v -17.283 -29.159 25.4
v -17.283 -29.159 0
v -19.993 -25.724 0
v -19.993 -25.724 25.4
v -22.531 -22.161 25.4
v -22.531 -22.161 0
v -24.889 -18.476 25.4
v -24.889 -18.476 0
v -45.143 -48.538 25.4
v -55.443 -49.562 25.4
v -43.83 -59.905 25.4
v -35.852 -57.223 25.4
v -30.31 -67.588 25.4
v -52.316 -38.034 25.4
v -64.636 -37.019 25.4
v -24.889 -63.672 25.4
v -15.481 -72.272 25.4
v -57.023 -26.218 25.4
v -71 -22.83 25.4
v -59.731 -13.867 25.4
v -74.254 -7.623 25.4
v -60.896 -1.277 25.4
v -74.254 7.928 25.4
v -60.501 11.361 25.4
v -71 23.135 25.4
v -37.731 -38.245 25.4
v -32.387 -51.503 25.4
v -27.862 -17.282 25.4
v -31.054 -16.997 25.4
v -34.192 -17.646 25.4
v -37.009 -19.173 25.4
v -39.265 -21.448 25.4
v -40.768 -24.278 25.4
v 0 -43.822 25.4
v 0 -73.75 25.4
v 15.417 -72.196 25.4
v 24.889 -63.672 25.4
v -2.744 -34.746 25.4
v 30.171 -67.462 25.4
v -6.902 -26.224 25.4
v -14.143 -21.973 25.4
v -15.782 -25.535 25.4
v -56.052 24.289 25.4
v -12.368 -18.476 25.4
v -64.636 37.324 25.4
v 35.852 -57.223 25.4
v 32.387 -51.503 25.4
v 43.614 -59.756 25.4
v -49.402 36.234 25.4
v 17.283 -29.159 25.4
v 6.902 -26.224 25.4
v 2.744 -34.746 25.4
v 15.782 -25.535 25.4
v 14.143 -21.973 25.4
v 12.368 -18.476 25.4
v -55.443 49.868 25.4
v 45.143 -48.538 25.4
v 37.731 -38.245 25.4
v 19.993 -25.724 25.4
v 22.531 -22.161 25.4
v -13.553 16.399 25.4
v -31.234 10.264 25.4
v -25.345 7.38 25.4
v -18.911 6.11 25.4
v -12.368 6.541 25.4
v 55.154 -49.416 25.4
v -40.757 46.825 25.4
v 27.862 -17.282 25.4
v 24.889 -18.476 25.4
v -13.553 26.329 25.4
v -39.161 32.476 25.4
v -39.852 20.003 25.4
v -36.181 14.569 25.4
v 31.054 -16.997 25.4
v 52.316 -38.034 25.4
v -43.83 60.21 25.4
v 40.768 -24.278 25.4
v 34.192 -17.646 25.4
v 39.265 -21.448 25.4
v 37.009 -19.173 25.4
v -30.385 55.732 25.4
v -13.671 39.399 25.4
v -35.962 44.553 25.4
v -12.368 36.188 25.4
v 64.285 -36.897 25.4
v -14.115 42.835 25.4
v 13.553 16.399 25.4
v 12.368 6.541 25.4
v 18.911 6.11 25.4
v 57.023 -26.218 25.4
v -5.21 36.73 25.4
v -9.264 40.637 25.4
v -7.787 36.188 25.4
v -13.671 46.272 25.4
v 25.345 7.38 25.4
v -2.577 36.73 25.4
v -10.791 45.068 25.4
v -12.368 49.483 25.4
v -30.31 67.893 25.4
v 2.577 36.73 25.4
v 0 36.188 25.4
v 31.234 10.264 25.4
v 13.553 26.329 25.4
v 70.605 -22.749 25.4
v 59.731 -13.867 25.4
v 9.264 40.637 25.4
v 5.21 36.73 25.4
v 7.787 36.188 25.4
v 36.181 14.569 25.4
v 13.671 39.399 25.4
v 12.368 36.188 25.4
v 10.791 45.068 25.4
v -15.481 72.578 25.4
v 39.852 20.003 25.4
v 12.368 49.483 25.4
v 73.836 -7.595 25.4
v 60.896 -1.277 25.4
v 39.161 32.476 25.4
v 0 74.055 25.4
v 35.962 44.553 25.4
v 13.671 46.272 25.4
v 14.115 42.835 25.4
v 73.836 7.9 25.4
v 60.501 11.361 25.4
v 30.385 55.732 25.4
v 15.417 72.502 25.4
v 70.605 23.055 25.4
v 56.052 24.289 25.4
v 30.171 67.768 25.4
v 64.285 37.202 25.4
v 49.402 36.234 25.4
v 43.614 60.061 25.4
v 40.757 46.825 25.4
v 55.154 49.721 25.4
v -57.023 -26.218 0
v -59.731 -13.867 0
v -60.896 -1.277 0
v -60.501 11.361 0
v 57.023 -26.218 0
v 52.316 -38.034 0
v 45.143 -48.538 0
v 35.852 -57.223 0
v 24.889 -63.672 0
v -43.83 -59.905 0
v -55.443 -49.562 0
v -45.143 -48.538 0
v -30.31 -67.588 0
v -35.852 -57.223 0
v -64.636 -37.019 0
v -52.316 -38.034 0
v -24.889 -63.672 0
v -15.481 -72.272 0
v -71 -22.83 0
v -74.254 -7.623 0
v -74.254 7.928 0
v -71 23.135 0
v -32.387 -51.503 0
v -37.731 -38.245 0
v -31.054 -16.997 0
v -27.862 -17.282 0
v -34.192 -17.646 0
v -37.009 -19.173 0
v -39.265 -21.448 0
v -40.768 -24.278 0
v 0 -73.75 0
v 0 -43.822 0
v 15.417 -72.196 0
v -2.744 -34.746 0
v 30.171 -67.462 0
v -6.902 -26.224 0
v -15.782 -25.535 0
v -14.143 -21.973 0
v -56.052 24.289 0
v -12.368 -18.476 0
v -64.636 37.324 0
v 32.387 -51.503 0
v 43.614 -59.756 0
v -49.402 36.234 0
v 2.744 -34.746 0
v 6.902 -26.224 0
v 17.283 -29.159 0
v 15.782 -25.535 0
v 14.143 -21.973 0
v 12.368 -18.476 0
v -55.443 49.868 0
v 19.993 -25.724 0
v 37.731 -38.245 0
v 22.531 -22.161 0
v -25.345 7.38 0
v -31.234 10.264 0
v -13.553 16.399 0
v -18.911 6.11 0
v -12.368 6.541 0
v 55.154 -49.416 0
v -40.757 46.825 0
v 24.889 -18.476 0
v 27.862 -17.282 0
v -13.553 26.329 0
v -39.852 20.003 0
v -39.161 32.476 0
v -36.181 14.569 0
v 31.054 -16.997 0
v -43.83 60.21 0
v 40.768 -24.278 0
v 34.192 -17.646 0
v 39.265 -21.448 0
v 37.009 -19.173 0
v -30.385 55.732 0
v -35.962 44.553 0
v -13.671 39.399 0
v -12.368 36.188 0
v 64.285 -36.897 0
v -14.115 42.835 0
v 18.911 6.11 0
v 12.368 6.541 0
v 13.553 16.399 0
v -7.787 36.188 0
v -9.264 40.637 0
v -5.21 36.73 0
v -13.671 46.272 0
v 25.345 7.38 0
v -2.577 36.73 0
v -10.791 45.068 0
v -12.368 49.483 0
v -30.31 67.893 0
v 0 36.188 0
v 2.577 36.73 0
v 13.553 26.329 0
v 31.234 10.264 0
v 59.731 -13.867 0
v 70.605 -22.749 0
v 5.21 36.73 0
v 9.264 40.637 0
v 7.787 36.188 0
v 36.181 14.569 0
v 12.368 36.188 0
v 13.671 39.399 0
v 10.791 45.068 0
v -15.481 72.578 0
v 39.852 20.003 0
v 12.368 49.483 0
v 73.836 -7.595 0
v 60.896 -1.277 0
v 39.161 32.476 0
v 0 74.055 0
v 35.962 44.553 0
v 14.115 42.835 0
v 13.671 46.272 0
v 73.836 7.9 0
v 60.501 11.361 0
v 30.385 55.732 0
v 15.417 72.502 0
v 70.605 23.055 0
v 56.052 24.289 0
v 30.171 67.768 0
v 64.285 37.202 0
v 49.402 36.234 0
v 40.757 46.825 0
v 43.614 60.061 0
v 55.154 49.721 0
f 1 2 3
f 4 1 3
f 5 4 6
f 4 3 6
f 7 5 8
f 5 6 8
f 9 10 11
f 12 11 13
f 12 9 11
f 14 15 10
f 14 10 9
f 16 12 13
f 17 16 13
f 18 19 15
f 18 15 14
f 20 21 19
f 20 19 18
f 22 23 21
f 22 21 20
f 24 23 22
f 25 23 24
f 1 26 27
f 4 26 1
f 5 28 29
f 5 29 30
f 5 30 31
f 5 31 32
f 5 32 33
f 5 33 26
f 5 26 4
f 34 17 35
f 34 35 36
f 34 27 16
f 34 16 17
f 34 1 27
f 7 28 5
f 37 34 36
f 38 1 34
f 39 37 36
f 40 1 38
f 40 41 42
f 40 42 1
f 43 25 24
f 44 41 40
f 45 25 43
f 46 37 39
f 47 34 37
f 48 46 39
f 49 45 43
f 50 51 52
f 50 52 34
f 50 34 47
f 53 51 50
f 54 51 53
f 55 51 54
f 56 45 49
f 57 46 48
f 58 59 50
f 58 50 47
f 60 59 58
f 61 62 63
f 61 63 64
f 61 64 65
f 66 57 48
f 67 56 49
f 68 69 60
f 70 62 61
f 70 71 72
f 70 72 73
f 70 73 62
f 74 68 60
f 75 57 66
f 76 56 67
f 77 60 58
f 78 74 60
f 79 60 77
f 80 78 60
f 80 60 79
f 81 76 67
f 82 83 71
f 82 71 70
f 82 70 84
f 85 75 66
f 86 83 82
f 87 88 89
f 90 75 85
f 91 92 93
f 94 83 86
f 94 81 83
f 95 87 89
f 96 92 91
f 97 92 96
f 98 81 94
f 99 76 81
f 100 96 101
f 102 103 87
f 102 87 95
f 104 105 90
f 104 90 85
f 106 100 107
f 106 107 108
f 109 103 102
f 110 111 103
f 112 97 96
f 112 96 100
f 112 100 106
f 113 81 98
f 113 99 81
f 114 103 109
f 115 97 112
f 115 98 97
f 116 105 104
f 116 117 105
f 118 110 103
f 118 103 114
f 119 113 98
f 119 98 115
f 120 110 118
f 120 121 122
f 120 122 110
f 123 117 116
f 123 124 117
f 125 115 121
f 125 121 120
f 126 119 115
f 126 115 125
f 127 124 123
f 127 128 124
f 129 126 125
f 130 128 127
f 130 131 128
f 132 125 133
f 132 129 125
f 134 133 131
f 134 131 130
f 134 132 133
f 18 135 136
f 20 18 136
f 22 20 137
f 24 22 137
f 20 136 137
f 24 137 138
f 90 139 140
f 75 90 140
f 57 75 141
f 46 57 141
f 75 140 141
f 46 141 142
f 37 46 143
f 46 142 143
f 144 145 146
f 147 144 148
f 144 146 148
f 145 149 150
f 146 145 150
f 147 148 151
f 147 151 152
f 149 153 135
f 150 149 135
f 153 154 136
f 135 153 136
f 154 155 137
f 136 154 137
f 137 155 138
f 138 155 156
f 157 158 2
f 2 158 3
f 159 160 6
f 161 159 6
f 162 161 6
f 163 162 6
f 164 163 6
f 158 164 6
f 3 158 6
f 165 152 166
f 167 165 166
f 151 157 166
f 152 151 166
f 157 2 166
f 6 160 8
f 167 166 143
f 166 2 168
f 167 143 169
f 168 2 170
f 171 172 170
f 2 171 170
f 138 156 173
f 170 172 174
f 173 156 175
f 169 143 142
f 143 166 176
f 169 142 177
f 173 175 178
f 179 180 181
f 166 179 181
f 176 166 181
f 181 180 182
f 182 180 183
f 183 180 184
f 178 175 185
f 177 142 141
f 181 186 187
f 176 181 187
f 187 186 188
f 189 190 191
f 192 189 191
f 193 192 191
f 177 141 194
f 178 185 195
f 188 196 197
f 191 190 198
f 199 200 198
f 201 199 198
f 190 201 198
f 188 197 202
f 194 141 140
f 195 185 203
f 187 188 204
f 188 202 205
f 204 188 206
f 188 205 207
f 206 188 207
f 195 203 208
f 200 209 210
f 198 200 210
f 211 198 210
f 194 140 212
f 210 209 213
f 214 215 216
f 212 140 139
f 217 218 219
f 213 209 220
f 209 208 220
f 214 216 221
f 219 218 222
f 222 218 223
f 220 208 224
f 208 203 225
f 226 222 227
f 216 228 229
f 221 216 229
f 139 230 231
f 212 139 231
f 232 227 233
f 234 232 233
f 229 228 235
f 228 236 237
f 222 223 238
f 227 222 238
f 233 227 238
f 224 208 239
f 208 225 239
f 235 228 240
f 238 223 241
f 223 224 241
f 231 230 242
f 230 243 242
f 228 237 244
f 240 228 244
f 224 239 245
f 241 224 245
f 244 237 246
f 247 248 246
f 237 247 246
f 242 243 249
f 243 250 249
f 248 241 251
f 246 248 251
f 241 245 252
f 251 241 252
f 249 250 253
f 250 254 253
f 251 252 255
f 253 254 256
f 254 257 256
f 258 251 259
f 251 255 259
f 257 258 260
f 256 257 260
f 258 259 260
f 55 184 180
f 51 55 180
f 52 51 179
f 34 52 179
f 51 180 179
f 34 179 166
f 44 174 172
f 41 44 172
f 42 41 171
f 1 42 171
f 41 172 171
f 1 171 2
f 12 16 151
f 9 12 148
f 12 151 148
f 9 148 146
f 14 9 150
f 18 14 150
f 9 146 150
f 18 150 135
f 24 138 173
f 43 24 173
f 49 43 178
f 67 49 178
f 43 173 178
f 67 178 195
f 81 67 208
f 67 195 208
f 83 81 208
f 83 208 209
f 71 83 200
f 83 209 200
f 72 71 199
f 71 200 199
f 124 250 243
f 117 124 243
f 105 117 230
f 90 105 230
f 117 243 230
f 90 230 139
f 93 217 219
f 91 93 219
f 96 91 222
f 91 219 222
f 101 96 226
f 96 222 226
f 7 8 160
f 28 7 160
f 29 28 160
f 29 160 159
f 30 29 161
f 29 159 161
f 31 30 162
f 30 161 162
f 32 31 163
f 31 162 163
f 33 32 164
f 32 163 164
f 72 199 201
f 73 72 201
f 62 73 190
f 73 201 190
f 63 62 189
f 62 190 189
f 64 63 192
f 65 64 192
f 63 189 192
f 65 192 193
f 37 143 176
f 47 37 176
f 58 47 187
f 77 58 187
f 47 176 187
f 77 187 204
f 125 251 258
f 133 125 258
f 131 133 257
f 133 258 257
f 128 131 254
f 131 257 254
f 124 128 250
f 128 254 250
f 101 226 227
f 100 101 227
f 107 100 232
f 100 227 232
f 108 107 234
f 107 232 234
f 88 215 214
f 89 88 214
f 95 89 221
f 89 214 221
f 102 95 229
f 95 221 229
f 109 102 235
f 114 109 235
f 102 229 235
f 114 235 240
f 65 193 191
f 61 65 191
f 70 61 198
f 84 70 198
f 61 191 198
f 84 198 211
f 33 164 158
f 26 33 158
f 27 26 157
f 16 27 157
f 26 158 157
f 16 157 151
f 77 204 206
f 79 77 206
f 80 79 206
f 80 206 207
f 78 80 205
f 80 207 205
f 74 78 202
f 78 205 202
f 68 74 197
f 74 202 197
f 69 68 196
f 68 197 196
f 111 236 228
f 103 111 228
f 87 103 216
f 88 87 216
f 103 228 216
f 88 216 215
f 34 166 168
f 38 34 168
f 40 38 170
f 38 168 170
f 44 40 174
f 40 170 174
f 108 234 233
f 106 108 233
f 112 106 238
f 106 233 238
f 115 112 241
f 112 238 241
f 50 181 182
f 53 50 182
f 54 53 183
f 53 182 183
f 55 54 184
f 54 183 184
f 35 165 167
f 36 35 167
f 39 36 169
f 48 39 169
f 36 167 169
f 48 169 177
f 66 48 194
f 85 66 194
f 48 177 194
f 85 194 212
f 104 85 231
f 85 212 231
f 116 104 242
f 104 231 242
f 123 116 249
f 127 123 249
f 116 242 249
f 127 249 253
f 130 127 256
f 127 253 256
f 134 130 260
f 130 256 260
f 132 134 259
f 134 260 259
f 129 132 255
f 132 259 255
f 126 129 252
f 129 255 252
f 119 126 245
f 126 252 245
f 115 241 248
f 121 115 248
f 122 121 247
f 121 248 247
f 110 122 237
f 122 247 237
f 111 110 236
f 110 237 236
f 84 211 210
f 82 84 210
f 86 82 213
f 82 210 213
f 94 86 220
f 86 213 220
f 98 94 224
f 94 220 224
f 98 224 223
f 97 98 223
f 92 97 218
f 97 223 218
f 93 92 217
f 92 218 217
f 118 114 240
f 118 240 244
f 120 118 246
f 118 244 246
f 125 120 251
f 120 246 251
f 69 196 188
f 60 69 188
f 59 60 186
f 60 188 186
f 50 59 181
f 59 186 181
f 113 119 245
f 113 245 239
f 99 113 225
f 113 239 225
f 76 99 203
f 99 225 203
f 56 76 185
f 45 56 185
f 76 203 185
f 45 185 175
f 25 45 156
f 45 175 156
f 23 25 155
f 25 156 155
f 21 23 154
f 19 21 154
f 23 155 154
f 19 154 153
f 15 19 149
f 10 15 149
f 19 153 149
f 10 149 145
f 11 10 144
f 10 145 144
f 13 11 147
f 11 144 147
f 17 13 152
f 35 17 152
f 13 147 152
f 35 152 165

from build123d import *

# Parameters (mm, degrees)
F1_DEPTH = 25.4


with BuildPart() as f1:
    # F0 (on Top) → F1 (new body)
    with BuildSketch(Plane.XY):
        with BuildLine():
            ThreePointArc((0, 74.055061), (-74.663883, 0.152692), (0, -73.749676))
            ThreePointArc((0, -73.749676), (74.243208, 0.152692), (0, 74.055061))
        make_face()
        with BuildLine():
            ThreePointArc((-57.023406, -26.218485), (-60.507444, -7.590035), (-60.500612, 11.36142))
            ThreePointArc((-60.500612, 11.36142), (-49.402322, 36.234016), (-30.385477, 55.732161))
            ThreePointArc((-30.385477, 55.732161), (-37.869253, 38.596059), (-39.85231, 20.002501))
            ThreePointArc((-39.85231, 20.002501), (-28.383603, 8.629948), (-12.367958, 6.540619))
            ThreePointArc((-12.367958, 6.540619), (-13.701344, 21.364175), (-12.367958, 36.187731))
            ThreePointArc((-12.367958, 36.187731), (-14.11452, 42.835135), (-12.367958, 49.482539))
            ThreePointArc((-12.367958, 49.482539), (-10.020724, 42.85473), (-7.787234, 36.187731))
            ThreePointArc((-7.787234, 36.187731), (-3.893617, 36.798721), (0, 36.187731))
            ThreePointArc((0, 36.187731), (3.893617, 36.798721), (7.787234, 36.187731))
            ThreePointArc((7.787234, 36.187731), (10.020724, 42.85473), (12.367958, 49.482539))
            ThreePointArc((12.367958, 49.482539), (14.11452, 42.835135), (12.367958, 36.187731))
            ThreePointArc((12.367958, 36.187731), (13.701344, 21.364175), (12.367958, 6.540619))
            ThreePointArc((12.367958, 6.540619), (28.383603, 8.629948), (39.85231, 20.002501))
            ThreePointArc((39.85231, 20.002501), (37.869253, 38.596059), (30.385477, 55.732161))
            ThreePointArc((30.385477, 55.732161), (49.402322, 36.234016), (60.500612, 11.36142))
            ThreePointArc((60.500612, 11.36142), (60.507444, -7.590035), (57.023406, -26.218485))
            ThreePointArc((57.023406, -26.218485), (45.143136, -48.537797), (24.888607, -63.672081))
            ThreePointArc((24.888607, -63.672081), (35.339447, -44.987114), (40.768456, -24.277844))
            ThreePointArc((40.768456, -24.277844), (34.191606, -17.646196), (24.888607, -18.475592))
            ThreePointArc((24.888607, -18.475592), (21.283884, -23.958158), (17.282898, -29.158607))
            ThreePointArc((17.282898, -29.158607), (14.979822, -23.746067), (12.367958, -18.475592))
            ThreePointArc((12.367958, -18.475592), (4.65192, -30.401362), (0, -43.822274))
            ThreePointArc((0, -43.822274), (-4.65192, -30.401362), (-12.367958, -18.475592))
            ThreePointArc((-12.367958, -18.475592), (-14.979822, -23.746067), (-17.282898, -29.158607))
            ThreePointArc((-17.282898, -29.158607), (-21.283884, -23.958158), (-24.888607, -18.475592))
            ThreePointArc((-24.888607, -18.475592), (-34.191606, -17.646196), (-40.768456, -24.277844))
            ThreePointArc((-40.768456, -24.277844), (-35.339447, -44.987114), (-24.888607, -63.672081))
            ThreePointArc((-24.888607, -63.672081), (-45.143136, -48.537797), (-57.023406, -26.218485))
        make_face(mode=Mode.SUBTRACT)
    extrude(amount=F1_DEPTH)


solid = f1.part
